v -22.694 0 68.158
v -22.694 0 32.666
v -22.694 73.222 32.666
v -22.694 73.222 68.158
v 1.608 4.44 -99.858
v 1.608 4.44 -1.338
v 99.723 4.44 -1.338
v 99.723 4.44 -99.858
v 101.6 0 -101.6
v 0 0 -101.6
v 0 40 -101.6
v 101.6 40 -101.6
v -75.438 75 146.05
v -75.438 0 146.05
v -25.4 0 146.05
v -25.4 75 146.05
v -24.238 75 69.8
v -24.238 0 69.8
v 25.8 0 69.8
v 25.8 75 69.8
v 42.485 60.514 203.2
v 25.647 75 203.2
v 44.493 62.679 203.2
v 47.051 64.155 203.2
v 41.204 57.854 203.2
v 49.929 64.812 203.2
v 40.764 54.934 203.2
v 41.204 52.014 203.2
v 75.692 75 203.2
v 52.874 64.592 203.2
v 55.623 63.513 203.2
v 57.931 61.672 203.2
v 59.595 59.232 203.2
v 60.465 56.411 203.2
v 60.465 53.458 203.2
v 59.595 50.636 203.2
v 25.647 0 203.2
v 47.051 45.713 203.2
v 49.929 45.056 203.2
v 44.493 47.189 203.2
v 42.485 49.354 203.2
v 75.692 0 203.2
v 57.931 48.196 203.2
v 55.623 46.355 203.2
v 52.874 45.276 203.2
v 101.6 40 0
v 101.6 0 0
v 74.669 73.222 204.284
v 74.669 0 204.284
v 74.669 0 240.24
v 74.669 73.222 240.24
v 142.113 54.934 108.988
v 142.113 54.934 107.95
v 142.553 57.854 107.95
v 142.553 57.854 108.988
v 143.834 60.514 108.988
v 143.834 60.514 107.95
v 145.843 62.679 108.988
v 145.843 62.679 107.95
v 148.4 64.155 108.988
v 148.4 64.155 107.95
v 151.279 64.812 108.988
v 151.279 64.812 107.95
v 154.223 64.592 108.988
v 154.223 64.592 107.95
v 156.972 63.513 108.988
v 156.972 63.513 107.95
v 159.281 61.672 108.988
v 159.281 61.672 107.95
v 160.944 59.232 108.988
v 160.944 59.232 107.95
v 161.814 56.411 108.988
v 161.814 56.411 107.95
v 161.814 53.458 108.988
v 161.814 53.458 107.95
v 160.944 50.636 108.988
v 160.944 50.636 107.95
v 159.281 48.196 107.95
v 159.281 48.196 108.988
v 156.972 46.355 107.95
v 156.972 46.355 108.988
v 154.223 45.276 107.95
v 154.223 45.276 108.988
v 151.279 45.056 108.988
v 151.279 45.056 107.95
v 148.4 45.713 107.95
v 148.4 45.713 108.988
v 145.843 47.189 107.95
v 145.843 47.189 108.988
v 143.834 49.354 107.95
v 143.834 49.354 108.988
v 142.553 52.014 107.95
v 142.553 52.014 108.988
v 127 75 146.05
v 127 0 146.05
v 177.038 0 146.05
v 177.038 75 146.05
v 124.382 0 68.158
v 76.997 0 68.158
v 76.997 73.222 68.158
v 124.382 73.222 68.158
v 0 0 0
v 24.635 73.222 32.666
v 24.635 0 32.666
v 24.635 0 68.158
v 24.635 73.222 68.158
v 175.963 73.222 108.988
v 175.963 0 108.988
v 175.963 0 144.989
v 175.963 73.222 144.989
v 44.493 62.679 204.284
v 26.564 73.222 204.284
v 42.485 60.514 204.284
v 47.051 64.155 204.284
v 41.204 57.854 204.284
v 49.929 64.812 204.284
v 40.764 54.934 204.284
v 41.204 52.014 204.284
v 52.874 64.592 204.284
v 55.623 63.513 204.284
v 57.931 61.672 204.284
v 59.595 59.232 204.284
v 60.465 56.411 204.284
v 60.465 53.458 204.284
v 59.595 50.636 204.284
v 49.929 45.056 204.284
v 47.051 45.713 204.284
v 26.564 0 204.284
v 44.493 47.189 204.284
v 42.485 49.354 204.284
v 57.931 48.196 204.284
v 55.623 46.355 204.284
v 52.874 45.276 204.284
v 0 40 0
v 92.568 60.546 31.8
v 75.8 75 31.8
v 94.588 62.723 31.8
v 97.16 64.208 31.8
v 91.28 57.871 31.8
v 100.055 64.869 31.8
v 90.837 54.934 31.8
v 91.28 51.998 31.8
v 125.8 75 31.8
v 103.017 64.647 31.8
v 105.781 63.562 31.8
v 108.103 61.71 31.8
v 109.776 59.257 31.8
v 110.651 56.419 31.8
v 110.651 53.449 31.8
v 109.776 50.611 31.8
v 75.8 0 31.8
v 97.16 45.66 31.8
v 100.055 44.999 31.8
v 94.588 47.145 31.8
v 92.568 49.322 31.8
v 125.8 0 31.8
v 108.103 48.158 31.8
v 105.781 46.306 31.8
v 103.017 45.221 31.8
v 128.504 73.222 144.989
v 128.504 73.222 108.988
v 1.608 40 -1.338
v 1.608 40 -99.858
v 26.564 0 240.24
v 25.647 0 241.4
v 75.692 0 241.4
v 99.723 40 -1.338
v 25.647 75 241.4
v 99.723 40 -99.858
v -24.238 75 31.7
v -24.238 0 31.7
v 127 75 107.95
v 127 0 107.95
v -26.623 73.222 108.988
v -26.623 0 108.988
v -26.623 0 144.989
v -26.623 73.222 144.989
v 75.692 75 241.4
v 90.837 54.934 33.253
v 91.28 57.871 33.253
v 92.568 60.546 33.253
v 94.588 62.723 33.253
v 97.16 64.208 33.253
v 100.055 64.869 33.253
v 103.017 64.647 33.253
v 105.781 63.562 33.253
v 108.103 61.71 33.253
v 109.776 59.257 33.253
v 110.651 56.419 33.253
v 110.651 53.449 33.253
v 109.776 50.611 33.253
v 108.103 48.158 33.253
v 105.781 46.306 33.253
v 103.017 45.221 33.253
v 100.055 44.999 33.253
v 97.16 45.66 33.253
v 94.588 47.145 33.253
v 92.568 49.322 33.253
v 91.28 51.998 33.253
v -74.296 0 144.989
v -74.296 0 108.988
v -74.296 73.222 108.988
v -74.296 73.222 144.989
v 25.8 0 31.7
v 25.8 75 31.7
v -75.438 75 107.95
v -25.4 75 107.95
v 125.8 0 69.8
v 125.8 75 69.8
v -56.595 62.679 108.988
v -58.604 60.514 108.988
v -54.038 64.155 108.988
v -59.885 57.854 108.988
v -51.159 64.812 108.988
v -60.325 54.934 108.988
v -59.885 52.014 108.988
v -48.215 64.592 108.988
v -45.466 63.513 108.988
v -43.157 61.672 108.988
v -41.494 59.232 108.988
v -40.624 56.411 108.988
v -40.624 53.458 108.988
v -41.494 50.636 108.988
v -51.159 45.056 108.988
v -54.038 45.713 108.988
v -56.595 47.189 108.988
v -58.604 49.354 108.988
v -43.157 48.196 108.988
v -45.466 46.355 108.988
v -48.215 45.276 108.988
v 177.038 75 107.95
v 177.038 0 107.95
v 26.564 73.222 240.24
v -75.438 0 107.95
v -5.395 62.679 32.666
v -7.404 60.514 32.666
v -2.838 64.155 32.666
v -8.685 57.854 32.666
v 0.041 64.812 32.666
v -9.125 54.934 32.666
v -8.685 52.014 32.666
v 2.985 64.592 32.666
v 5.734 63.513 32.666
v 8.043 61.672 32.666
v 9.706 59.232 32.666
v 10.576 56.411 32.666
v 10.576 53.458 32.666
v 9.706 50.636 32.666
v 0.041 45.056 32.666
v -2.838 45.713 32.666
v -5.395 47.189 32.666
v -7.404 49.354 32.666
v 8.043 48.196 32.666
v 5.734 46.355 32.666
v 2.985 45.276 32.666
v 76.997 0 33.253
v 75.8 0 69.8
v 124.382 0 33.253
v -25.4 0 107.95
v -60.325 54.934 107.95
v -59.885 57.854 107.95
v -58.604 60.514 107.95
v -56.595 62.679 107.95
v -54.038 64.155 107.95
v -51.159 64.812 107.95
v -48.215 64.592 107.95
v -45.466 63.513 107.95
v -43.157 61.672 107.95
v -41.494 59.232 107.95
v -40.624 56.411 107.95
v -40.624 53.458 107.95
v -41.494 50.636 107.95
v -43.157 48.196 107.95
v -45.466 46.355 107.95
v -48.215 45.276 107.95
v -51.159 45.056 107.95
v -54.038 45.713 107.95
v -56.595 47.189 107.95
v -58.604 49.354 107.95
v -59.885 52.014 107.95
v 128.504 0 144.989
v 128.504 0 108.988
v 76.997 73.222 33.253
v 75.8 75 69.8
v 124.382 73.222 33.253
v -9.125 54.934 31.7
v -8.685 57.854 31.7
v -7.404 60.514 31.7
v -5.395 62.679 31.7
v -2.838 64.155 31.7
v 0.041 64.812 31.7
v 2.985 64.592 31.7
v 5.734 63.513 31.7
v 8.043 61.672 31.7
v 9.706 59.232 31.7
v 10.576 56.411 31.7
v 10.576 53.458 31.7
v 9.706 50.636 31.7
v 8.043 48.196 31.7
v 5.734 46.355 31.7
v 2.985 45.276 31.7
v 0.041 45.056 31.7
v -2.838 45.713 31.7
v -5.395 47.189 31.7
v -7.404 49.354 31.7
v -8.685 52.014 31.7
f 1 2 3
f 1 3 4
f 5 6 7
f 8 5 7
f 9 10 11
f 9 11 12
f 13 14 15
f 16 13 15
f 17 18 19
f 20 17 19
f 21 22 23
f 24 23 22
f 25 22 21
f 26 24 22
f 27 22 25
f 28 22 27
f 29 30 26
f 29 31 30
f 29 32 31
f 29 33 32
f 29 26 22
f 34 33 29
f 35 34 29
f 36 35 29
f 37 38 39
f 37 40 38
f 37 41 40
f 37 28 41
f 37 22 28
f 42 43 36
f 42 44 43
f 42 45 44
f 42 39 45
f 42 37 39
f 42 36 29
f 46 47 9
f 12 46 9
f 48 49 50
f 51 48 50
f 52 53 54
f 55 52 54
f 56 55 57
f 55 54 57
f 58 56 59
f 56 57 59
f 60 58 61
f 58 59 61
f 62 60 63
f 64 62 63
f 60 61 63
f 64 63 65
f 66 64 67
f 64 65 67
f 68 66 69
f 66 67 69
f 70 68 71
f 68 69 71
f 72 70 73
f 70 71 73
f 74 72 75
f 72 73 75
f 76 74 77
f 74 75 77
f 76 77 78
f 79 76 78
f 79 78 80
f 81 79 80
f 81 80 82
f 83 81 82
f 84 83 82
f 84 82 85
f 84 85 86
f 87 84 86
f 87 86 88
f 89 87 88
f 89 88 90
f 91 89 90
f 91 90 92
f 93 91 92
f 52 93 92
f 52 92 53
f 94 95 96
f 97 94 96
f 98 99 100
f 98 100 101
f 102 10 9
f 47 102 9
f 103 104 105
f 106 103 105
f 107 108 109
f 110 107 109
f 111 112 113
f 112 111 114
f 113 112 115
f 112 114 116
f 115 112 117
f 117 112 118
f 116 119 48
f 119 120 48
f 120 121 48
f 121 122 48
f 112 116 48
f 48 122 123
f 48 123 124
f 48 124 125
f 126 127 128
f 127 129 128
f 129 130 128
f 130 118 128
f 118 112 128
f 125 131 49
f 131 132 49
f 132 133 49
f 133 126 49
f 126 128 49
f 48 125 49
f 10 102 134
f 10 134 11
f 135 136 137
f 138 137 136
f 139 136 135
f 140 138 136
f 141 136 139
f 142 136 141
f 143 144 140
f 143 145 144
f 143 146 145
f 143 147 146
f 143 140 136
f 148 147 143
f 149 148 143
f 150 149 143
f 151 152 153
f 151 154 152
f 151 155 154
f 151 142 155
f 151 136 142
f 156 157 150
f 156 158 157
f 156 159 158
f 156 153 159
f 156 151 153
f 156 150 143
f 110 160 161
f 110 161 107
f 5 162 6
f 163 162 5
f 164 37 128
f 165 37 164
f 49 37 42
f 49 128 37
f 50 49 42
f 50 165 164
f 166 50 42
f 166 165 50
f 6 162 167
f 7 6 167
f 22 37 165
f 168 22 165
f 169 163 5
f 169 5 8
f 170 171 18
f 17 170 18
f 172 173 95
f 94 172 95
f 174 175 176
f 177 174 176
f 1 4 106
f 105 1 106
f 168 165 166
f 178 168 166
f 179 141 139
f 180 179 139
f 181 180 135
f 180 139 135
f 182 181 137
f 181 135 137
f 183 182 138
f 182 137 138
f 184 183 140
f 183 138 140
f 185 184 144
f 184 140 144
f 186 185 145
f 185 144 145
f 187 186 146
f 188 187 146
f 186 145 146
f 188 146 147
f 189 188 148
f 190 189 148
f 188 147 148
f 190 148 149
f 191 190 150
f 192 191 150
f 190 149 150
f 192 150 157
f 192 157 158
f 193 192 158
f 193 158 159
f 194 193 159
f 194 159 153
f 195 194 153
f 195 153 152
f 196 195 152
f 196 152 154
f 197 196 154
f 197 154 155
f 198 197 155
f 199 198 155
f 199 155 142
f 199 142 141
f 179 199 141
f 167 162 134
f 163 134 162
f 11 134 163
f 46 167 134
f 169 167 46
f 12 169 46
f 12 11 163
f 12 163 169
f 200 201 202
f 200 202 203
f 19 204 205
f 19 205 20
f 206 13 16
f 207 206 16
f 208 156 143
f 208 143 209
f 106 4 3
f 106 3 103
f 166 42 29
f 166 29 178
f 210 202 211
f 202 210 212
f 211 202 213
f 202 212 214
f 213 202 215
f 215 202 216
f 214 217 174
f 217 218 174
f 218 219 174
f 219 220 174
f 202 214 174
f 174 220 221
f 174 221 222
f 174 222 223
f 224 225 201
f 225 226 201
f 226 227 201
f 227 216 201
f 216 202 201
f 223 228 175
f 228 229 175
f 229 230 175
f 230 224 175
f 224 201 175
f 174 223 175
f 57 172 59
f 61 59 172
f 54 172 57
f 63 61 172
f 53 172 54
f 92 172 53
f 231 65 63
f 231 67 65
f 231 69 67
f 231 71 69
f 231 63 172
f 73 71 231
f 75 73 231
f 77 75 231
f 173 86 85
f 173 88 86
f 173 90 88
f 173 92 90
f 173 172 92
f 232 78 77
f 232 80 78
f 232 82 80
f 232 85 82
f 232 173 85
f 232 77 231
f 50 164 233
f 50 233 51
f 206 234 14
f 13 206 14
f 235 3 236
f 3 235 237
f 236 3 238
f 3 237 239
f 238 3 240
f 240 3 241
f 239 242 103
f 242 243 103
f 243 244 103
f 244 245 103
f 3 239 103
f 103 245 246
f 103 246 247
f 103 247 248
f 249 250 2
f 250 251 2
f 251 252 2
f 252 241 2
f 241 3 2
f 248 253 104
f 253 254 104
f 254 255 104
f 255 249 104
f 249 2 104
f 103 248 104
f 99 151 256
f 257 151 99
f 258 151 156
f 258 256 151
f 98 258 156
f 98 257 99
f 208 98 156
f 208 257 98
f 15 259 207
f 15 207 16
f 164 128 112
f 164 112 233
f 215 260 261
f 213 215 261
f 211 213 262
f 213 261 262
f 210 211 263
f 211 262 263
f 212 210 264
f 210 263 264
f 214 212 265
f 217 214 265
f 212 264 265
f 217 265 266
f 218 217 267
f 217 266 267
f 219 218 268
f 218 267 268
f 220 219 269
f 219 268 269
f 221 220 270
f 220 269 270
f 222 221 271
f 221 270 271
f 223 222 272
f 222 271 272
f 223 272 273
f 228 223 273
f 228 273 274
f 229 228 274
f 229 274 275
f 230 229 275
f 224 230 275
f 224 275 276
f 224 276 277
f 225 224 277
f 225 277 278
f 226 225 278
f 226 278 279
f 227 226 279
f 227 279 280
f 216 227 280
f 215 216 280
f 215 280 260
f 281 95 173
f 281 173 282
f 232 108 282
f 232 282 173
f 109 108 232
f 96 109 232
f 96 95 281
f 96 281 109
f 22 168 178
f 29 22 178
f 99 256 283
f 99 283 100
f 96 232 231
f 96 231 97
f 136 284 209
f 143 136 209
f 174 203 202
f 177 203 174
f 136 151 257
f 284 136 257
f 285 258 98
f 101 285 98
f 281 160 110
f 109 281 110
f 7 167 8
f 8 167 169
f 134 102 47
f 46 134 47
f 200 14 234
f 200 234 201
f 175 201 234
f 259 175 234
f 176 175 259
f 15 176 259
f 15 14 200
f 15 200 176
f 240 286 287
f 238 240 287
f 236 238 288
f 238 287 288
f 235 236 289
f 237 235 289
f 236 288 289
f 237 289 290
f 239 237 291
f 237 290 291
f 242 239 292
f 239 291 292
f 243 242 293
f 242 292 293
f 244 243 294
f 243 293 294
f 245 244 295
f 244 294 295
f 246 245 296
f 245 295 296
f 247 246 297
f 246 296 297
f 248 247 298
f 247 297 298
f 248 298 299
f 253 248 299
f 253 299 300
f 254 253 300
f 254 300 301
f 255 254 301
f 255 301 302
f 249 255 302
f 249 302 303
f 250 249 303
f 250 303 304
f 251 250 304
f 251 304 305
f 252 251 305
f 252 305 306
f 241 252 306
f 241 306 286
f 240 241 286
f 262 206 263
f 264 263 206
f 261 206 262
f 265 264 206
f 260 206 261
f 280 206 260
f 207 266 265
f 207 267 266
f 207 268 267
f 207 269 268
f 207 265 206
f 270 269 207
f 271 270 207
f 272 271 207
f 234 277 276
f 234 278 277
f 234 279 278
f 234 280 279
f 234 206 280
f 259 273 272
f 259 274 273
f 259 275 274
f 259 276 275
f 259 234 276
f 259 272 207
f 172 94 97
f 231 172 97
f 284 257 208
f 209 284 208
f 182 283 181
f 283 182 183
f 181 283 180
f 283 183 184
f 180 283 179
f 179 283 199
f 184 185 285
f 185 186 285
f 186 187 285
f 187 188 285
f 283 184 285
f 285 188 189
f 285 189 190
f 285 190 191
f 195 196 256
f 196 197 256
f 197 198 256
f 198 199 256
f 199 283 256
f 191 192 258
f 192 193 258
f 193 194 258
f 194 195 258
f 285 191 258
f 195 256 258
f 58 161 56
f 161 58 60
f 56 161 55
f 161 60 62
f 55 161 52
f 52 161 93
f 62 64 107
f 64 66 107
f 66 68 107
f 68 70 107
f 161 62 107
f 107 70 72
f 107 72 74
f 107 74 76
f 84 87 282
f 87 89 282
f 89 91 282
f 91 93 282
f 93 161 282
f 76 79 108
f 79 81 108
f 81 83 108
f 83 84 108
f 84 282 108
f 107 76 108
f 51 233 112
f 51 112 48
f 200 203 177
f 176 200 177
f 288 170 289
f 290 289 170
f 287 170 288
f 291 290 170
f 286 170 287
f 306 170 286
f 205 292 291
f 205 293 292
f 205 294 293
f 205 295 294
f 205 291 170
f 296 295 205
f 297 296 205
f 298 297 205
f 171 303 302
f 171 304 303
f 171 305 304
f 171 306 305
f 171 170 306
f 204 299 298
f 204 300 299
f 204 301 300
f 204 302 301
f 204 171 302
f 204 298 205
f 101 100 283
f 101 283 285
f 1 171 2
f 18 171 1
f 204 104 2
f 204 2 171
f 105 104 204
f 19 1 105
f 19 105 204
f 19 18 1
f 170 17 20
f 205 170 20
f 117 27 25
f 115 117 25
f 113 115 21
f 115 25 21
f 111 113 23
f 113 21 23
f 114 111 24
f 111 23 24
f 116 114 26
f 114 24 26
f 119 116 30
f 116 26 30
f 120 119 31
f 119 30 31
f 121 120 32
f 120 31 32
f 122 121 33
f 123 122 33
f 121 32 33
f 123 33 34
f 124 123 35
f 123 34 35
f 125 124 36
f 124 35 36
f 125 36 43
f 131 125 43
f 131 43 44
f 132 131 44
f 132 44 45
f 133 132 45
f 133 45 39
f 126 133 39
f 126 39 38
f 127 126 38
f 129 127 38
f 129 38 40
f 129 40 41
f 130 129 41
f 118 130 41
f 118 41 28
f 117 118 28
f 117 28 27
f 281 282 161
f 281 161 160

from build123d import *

# Parameters (mm, degrees)
SKETCH1_W             = 101.6
SKETCH1_H             = 101.6
BOSS_EXTRUDE1_DEPTH   = 39.99992
SKETCH2_W             = 98.115054024
SKETCH2_H             = 98.519374302
CUT_EXTRUDE1_DEPTH    = 35.56
SKETCH3_W             = 49.9999
SKETCH3_H             = 37.999924
BOSS_EXTRUDE2_DEPTH   = 75.000104
SKETCH3_W_2           = 50.038
SKETCH3_H_2           = 38.1
BOSS_EXTRUDE2_2_DEPTH = 75.000104
BOSS_EXTRUDE2_3_DEPTH = 75.000104
BOSS_EXTRUDE2_4_DEPTH = 75.000104
SKETCH3_W_3           = 50.044709845
SKETCH3_H_3           = 38.200481576
BOSS_EXTRUDE2_5_DEPTH = 75.000104
SKETCH4_W             = 47.673303357
SKETCH4_H             = 36.001078641
SKETCH4_W_2           = 47.329126014
SKETCH4_H_2           = 35.49131434
SKETCH4_W_3           = 47.385353059
SKETCH4_H_3           = 34.904518915
SKETCH4_W_4           = 47.458878428
SKETCH4_W_5           = 48.104938799
SKETCH4_H_4           = 35.956464733
CUT_EXTRUDE2_DEPTH    = 73.222104
SKETCH5_R             = 9.906
SKETCH5_R_2           = 9.962701018
CUT_EXTRUDE3_DEPTH    = 9.722104
SKETCH6_R             = 9.906
CUT_EXTRUDE4_DEPTH    = 9.722104
SKETCH7_R             = 9.906
CUT_EXTRUDE5_DEPTH    = 9.722104


with BuildPart() as part:
    # Sketch1 → Boss-Extrude1 (new body)
    with BuildSketch(Plane(origin=(0, 0, 0), x_dir=(1, 0, 0), z_dir=(0, 1, 0))):
        with Locations((50.8, 50.8)):
            Rectangle(SKETCH1_W, SKETCH1_H)
    extrude(amount=BOSS_EXTRUDE1_DEPTH)

    # Sketch2 → Cut-Extrude1 (cut)
    with BuildSketch(Plane(origin=(0, 39.99992, 0), x_dir=(1, 0, 0), z_dir=(0, 1, 0))):
        with Locations((50.665226574, 50.597839861)):
            Rectangle(SKETCH2_W, SKETCH2_H)
    extrude(amount=-CUT_EXTRUDE1_DEPTH, mode=Mode.SUBTRACT)


with BuildPart() as body_2:
    # Sketch3 → Boss-Extrude2 (new body)
    with BuildSketch(Plane.XZ):
        with Locations((100.7999508, 50.8000254)):
            Rectangle(SKETCH3_W, SKETCH3_H)
    extrude(amount=-BOSS_EXTRUDE2_DEPTH)


with BuildPart() as body_3:
    # Sketch3 → Boss-Extrude2 2 (new body)
    with BuildSketch(Plane.XZ):
        with Locations((0.7809992, 50.7499874)):
            Rectangle(SKETCH3_W_2, SKETCH3_H_2)
    extrude(amount=-BOSS_EXTRUDE2_2_DEPTH)


with BuildPart() as body_4:
    # Sketch3 → Boss-Extrude2 3 (new body)
    with BuildSketch(Plane.XZ):
        with Locations((152.019, 127)):
            Rectangle(SKETCH3_W_2, SKETCH3_H_2)
    extrude(amount=-BOSS_EXTRUDE2_3_DEPTH)


with BuildPart() as body_5:
    # Sketch3 → Boss-Extrude2 4 (new body)
    with BuildSketch(Plane.XZ):
        with Locations((-50.419, 127)):
            Rectangle(SKETCH3_W_2, SKETCH3_H_2)
    extrude(amount=-BOSS_EXTRUDE2_4_DEPTH)


with BuildPart() as body_6:
    # Sketch3 → Boss-Extrude2 5 (new body)
    with BuildSketch(Plane.XZ):
        with Locations((50.669645078, 222.300240788)):
            Rectangle(SKETCH3_W_3, SKETCH3_H_3)
    extrude(amount=-BOSS_EXTRUDE2_5_DEPTH)


with BuildPart() as cut_extrude2_tool:
    # Sketch4 → Cut-Extrude2 (new body)
    with BuildSketch(Plane.XZ):
        with Locations((-50.459366902, 126.988435685)):
            Rectangle(SKETCH4_W, SKETCH4_H)
        with Locations((0.970104392, 50.412109166)):
            Rectangle(SKETCH4_W_2, SKETCH4_H_2)
        with Locations((100.689433749, 50.705506879)):
            Rectangle(SKETCH4_W_3, SKETCH4_H_3)
        with Locations((152.233471247, 126.988435685)):
            Rectangle(SKETCH4_W_4, SKETCH4_H)
        with Locations((50.616530906, 222.262061552)):
            Rectangle(SKETCH4_W_5, SKETCH4_H_4)
    extrude(amount=-CUT_EXTRUDE2_DEPTH)


with BuildPart() as body_2_1:
    add(body_2.part)

    # Cut-Extrude2: cut by cut_extrude2_tool
    add(cut_extrude2_tool.part, mode=Mode.SUBTRACT)


with BuildPart() as body_3_1:
    add(body_3.part)

    # Cut-Extrude2: cut by cut_extrude2_tool
    add(cut_extrude2_tool.part, mode=Mode.SUBTRACT)


with BuildPart() as body_4_1:
    add(body_4.part)

    # Cut-Extrude2: cut by cut_extrude2_tool
    add(cut_extrude2_tool.part, mode=Mode.SUBTRACT)


with BuildPart() as body_5_1:
    add(body_5.part)

    # Cut-Extrude2: cut by cut_extrude2_tool
    add(cut_extrude2_tool.part, mode=Mode.SUBTRACT)


with BuildPart() as body_6_1:
    add(body_6.part)

    # Cut-Extrude2: cut by cut_extrude2_tool
    add(cut_extrude2_tool.part, mode=Mode.SUBTRACT)

    # Sketch7 → Cut-Extrude5 (cut)
    with BuildSketch(Plane(origin=(0, 0, 203.2), x_dir=(-1, 0, 0), z_dir=(0, 0, -1))):
        with Locations((-50.669645078, 54.934104)):
            Circle(SKETCH7_R)
    extrude(amount=-CUT_EXTRUDE5_DEPTH, mode=Mode.SUBTRACT)


with BuildPart() as cut_extrude3_tool:
    # Sketch5 → Cut-Extrude3 (new body)
    with BuildSketch(Plane(origin=(0, 0, 31.6999874), x_dir=(-1, 0, 0), z_dir=(0, 0, -1))):
        with Locations((-0.7809992, 54.934104)):
            Circle(SKETCH5_R)
        with Locations((-100.7999508, 54.934104)):
            Circle(SKETCH5_R_2)
    extrude(amount=-CUT_EXTRUDE3_DEPTH)


with BuildPart() as body_2_2:
    add(body_2_1.part)

    # Cut-Extrude3: cut by cut_extrude3_tool
    add(cut_extrude3_tool.part, mode=Mode.SUBTRACT)


with BuildPart() as body_3_2:
    add(body_3_1.part)

    # Cut-Extrude3: cut by cut_extrude3_tool
    add(cut_extrude3_tool.part, mode=Mode.SUBTRACT)


with BuildPart() as cut_extrude4_tool:
    # Sketch6 → Cut-Extrude4 (new body)
    with BuildSketch(Plane(origin=(0, 0, 107.95), x_dir=(-1, 0, 0), z_dir=(0, 0, -1))):
        with Locations((-152.019, 54.934104)):
            Circle(SKETCH6_R)
        with Locations((50.419, 54.934104)):
            Circle(SKETCH6_R)
    extrude(amount=-CUT_EXTRUDE4_DEPTH)


with BuildPart() as body_4_2:
    add(body_4_1.part)

    # Cut-Extrude4: cut by cut_extrude4_tool
    add(cut_extrude4_tool.part, mode=Mode.SUBTRACT)


with BuildPart() as body_5_2:
    add(body_5_1.part)

    # Cut-Extrude4: cut by cut_extrude4_tool
    add(cut_extrude4_tool.part, mode=Mode.SUBTRACT)


solid = Compound([part.part, body_6_1.part, body_2_2.part, body_3_2.part, body_4_2.part, body_5_2.part])
